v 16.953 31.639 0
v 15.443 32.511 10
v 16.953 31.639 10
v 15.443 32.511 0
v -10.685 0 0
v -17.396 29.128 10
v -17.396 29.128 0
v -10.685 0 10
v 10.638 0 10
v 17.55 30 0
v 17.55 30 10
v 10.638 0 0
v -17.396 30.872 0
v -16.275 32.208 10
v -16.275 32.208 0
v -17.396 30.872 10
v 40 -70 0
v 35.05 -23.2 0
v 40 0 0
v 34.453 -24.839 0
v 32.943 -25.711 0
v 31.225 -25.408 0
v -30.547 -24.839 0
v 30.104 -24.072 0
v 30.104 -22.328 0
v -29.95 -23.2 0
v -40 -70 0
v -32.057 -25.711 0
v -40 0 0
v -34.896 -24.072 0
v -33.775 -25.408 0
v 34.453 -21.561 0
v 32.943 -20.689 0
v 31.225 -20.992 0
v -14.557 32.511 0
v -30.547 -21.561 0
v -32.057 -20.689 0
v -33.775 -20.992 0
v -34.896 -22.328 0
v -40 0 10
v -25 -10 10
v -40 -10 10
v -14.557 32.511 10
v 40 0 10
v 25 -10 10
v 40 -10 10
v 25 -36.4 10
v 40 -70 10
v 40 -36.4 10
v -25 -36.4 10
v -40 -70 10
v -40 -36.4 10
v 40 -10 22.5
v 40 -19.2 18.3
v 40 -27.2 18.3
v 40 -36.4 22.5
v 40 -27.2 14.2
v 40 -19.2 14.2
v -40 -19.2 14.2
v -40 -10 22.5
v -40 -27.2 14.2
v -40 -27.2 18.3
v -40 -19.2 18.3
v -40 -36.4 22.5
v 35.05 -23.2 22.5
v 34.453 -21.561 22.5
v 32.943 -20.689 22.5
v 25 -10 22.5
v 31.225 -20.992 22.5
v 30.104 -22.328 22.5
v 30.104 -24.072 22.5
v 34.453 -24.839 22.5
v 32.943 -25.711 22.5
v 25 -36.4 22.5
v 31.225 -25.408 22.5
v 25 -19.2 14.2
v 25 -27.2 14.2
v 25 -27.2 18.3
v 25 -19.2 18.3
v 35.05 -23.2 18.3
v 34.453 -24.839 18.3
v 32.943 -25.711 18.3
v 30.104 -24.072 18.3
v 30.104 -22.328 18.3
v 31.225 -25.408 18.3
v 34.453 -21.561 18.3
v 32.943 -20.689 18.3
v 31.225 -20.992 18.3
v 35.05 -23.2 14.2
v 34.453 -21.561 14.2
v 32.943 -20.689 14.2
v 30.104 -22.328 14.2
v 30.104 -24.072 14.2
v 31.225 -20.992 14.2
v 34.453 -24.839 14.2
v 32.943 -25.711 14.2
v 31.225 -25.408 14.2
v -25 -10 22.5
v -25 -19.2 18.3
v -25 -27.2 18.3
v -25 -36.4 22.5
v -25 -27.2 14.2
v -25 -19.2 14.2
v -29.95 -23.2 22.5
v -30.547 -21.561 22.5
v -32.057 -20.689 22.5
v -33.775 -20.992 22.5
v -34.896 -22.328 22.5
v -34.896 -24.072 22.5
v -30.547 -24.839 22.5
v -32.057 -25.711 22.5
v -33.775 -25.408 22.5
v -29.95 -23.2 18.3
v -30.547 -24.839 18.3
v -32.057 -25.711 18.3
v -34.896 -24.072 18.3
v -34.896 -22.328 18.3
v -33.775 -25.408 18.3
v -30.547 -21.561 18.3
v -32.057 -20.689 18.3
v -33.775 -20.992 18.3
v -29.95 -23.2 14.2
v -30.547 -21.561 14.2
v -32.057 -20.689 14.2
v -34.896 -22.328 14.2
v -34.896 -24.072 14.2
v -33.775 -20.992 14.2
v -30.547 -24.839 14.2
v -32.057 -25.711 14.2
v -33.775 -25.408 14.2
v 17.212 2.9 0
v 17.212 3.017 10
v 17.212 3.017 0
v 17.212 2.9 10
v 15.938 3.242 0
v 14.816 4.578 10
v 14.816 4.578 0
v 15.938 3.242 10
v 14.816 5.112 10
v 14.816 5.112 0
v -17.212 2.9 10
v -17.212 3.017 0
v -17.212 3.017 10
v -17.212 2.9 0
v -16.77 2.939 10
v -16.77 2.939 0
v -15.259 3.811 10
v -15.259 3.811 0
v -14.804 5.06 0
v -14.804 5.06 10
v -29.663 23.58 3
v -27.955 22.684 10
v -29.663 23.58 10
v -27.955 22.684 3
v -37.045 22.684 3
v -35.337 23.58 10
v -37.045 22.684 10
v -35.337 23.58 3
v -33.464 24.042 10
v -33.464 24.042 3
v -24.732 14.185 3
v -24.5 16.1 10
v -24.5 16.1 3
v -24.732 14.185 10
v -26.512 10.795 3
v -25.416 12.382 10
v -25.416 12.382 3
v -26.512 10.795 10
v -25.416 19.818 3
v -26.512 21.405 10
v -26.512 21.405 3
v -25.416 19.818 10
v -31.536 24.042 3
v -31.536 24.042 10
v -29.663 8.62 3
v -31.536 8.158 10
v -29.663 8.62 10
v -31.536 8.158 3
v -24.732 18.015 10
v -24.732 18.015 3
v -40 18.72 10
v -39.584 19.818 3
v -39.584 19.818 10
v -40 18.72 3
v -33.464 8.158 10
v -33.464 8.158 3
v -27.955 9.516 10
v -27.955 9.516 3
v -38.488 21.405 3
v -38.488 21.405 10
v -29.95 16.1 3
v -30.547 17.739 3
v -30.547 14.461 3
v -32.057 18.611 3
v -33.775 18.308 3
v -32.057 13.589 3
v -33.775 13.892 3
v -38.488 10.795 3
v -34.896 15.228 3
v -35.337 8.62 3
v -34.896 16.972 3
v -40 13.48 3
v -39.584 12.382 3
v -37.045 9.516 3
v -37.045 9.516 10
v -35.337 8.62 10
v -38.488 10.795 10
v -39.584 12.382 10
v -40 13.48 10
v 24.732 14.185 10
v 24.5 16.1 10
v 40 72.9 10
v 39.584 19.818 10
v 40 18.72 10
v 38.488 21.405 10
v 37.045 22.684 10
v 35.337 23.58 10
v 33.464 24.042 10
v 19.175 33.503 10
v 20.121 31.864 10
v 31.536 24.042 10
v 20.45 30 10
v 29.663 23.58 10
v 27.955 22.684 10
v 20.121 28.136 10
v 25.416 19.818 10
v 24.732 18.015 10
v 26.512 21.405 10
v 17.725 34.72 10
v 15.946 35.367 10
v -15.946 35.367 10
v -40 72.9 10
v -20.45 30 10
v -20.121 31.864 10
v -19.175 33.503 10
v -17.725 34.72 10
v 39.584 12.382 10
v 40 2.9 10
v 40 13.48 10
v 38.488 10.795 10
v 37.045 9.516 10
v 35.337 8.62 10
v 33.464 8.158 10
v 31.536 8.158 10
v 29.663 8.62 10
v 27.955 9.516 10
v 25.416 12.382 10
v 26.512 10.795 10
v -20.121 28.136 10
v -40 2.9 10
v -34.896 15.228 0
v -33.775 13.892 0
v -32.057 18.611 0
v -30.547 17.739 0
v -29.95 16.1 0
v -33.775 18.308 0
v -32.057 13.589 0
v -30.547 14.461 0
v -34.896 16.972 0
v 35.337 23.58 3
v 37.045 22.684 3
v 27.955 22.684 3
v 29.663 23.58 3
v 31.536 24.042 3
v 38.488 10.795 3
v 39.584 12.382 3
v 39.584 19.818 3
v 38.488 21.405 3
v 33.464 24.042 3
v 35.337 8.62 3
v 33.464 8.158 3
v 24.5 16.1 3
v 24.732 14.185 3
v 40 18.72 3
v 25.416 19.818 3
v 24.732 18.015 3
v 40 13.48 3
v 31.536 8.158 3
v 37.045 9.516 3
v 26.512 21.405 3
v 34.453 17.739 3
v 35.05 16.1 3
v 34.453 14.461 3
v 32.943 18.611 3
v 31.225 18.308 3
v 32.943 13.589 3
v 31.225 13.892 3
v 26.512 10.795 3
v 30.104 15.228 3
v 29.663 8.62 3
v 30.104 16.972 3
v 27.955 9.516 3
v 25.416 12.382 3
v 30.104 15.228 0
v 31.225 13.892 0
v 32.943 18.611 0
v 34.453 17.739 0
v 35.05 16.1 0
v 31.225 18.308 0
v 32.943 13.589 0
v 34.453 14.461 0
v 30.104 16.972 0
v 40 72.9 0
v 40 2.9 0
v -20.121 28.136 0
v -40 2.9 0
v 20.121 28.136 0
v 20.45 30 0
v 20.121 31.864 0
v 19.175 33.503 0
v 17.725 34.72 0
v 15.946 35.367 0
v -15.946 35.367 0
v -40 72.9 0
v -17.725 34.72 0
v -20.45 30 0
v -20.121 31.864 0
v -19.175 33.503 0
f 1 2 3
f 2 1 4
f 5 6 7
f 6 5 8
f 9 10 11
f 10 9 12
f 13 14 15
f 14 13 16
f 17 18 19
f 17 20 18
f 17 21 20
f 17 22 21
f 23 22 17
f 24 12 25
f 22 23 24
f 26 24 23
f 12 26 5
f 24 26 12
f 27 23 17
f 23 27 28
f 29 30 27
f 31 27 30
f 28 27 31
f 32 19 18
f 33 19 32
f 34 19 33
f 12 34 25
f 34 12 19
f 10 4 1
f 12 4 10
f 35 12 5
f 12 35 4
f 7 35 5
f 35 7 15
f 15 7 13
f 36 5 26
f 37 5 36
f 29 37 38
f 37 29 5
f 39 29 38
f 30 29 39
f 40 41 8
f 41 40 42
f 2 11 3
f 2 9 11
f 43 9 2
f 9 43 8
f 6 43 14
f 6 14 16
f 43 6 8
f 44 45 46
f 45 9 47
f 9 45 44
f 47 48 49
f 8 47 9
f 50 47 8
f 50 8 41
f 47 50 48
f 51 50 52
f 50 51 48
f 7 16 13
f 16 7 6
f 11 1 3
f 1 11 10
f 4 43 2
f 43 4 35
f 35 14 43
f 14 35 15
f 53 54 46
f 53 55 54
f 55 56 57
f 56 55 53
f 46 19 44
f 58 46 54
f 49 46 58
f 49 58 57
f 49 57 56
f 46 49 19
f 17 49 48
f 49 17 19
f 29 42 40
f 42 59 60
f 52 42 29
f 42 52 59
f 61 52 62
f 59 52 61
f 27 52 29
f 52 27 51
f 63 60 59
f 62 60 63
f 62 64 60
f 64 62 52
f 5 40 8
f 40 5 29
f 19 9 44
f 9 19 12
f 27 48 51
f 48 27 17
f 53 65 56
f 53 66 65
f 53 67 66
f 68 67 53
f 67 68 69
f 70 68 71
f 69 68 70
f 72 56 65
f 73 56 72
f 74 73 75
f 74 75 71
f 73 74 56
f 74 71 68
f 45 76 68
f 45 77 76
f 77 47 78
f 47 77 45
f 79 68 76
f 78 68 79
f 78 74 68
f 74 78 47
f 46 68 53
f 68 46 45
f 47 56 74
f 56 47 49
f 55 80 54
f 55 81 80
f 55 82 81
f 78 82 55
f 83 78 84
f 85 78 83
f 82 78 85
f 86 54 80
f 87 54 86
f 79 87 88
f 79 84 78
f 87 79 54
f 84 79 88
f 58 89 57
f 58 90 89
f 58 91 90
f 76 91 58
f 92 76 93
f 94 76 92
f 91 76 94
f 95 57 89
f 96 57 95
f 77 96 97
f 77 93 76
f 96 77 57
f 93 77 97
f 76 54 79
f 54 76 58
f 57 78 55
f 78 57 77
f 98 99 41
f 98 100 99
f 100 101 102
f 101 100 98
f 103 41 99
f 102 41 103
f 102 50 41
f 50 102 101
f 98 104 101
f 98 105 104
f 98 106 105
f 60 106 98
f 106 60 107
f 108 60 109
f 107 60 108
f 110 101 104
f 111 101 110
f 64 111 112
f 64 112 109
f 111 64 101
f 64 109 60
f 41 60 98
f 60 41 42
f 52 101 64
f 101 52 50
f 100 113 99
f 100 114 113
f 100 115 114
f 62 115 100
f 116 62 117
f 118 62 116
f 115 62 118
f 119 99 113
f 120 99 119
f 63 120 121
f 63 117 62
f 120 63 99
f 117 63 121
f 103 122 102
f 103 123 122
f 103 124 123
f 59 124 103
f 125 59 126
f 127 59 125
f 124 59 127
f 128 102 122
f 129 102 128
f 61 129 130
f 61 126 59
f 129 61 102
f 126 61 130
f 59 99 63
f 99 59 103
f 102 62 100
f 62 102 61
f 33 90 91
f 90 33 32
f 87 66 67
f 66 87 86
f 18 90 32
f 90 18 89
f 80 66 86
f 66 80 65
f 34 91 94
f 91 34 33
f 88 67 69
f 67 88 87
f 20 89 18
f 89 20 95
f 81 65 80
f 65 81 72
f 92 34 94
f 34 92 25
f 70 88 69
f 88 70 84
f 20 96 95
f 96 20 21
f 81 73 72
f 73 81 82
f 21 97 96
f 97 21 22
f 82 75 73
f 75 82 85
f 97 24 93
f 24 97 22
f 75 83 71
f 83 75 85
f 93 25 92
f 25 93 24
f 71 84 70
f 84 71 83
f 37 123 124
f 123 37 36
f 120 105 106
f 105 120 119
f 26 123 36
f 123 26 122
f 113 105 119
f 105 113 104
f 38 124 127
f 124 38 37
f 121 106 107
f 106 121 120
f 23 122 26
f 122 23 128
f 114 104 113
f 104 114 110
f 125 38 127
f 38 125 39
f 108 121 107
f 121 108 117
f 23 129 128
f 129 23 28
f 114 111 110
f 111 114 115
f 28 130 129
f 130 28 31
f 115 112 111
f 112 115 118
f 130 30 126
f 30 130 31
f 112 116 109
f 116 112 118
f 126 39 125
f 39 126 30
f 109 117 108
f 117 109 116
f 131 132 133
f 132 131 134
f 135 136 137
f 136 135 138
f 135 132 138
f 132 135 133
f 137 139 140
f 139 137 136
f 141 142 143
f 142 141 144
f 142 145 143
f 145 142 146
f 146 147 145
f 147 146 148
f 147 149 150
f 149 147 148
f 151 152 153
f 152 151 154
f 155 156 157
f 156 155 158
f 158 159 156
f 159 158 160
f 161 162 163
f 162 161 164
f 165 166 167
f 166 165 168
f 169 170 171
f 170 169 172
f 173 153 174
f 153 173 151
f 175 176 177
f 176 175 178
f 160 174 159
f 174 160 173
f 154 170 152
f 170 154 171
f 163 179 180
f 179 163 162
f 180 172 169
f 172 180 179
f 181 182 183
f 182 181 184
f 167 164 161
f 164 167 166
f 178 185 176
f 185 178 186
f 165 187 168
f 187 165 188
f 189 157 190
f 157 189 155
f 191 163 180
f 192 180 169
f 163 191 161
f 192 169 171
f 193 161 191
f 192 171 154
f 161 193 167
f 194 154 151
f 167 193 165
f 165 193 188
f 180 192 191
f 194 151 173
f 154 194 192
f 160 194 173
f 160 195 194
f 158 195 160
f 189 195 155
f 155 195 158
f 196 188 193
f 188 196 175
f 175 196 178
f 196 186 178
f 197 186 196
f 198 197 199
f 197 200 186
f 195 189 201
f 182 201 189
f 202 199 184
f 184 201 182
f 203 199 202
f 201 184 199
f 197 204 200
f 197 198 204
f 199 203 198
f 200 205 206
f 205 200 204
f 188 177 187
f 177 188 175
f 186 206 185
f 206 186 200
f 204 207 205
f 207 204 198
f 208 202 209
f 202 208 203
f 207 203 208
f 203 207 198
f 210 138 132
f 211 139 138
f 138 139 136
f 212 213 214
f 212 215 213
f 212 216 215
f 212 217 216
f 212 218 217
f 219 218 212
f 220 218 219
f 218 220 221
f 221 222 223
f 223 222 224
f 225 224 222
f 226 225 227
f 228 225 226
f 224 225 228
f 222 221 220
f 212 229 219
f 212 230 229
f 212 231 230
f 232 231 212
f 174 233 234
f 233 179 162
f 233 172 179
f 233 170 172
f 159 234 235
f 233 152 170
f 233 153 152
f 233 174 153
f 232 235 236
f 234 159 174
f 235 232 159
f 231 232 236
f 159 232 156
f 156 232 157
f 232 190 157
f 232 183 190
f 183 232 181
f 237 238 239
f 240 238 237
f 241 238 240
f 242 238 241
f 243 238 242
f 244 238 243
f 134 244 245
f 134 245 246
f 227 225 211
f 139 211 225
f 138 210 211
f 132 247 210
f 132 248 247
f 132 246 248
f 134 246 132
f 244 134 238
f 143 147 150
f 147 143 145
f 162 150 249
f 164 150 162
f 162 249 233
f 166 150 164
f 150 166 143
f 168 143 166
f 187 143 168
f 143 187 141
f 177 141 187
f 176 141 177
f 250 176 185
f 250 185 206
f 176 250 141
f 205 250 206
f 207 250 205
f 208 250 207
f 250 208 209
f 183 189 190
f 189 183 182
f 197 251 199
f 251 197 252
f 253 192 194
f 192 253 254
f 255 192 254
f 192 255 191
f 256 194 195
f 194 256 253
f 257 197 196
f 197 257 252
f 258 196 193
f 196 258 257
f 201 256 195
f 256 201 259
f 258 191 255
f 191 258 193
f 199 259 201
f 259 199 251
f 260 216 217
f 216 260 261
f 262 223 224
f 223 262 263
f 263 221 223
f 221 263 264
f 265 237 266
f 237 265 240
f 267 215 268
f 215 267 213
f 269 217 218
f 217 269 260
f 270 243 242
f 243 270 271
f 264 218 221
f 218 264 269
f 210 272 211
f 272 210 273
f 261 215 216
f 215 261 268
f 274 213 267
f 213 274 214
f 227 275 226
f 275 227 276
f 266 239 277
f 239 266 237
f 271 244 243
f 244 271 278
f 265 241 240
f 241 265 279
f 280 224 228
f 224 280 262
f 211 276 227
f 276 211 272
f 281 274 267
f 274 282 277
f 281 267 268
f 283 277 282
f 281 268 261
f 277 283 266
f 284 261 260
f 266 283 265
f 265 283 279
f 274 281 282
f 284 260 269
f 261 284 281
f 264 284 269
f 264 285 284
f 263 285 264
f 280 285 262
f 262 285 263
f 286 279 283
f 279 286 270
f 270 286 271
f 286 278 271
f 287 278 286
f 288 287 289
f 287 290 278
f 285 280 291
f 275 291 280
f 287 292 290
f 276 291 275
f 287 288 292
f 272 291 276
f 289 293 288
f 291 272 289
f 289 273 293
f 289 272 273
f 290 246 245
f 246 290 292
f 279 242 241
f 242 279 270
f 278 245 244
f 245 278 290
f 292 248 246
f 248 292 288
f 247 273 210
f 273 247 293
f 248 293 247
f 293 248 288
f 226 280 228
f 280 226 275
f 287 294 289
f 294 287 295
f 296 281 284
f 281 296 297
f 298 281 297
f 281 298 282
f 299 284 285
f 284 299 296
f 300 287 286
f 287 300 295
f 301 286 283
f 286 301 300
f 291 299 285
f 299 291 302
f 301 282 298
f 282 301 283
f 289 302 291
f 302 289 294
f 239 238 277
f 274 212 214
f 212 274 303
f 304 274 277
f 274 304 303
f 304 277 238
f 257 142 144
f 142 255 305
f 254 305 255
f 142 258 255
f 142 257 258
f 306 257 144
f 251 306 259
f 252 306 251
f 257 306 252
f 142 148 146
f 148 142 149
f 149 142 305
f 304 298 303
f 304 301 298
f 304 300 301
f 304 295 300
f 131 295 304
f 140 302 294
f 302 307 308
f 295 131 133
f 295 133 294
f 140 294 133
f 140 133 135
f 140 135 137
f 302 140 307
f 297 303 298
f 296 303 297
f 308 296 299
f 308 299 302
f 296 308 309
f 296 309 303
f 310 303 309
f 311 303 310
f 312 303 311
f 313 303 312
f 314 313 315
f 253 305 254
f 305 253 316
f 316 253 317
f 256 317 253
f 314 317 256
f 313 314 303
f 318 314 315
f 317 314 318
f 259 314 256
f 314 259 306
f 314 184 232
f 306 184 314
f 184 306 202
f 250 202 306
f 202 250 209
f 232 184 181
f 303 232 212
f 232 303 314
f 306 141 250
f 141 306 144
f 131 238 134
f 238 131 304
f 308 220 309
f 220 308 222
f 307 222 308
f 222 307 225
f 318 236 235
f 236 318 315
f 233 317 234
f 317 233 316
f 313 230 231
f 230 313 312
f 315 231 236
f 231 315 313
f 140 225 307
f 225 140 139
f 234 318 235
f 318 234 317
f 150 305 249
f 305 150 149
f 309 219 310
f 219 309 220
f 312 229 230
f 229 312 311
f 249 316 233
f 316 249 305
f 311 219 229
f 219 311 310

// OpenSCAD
// Diameter of the routerbit
router=8;
// Diameter of the guide bushing
bushing = 10.8 + 0.1;
delta = bushing - router;

// Width of the dovetail at the wider end
dovewide = 30;
// Width of the dovetail at the narrower end
dovenarrow = 15;
// Depth of the dovetail
dovedept = 30;

// Width of the baseplate
basewidth = 80;
// Length of the baseplate
baselength = 70;

// Thickness of the template
templatethickness = 10;

// Width of the material
materialwidth = 50;
// Thickness of the material
materialthickness = 25;

// Screwshaft
screwshaft = 5.1;
// Diameter of the screwhead
screwheaddiameter = 16;
// Legnth of the Screwhead
screwheadlength = 7;
// Size of the pocket for the nut
nutparallelwidth = 8.0;
// Diagnal measurement of the nut
nutdiagonalwidth = 8.8;
// Thickness of the nut
nutthickness = 4.1;

// Shoulder
offset = 10;


// Size of the screwblocks
screwblocksize = (basewidth-materialwidth) / 2;


difference() {

  union() {

    translate([0,0,0]) {

        hull() {
          translate([-0.5*dovenarrow,-0.5*(router-delta),0]) cylinder(d=router-delta, h=templatethickness);
          translate([0.5*dovenarrow,-0.5*(router-delta),0]) cylinder(d=router-delta, h=templatethickness);
          translate([-0.5*dovewide,dovedept,0]) cylinder(d=router-delta, h=templatethickness);
          translate([0.5*dovewide,dovedept,0]) cylinder(d=router-delta, h=templatethickness);
        }

        translate([-0.5*basewidth,-baselength,0]) cube([basewidth,baselength,templatethickness]);

    }

    translate([materialthickness, -3*nutdiagonalwidth-offset, 0])
      difference() {
        cube([screwblocksize,3*nutdiagonalwidth, 0.5*materialthickness+templatethickness]);
        translate([0.5*screwblocksize,1.5*nutdiagonalwidth,0.25*materialthickness+templatethickness]) cube([1.1*screwblocksize,nutparallelwidth,nutthickness], center=true);
    }

    translate([-materialthickness-screwblocksize, -3*nutdiagonalwidth-offset, 0])
      difference() {
        cube([screwblocksize,3*nutdiagonalwidth, 0.5*materialthickness+templatethickness]);
        translate([0.5*screwblocksize,1.5*nutdiagonalwidth,0.25*materialthickness+templatethickness]) cube([1.1*screwblocksize,nutparallelwidth,nutthickness], center=true);
    }

  }

  translate([materialthickness, -3*nutdiagonalwidth-offset, 0])
      translate([0.5*screwblocksize,1.5*nutdiagonalwidth]) cylinder(d=screwshaft,h=1.1*(0.5*materialthickness+templatethickness));


  translate([-materialthickness-screwblocksize, -3*nutdiagonalwidth-offset, 0])
      translate([0.5*screwblocksize,1.5*nutdiagonalwidth]) cylinder(d=screwshaft,h=1.1*(0.5*materialthickness+templatethickness));

}

// Here comes the negative form

radius = 0.5 * (router-delta);
dy = (radius+delta);

angle = atan(((dovewide-dovenarrow)/2)/dovedept);
d1 = tan(angle) * dy;
dx = dovenarrow/2 +radius + 2*delta +d1;

translate([0,0,templatethickness]) mirror([0,0,1])
difference() {

  translate([-0.5*basewidth,delta,0]) cube([basewidth,baselength,templatethickness]);

    hull() {
      translate([-0.5*dovenarrow,-0.5*(router-delta),-0.1]) cylinder(d=router+delta, h=templatethickness*1.1);
      translate([0.5*dovenarrow,-0.5*(router-delta),-0.1]) cylinder(d=router+delta, h=templatethickness*1.1);
      translate([-0.5*dovewide,dovedept,-0.1]) cylinder(d=router+delta, h=templatethickness*1.1);
      translate([0.5*dovewide,dovedept,-0.1]) cylinder(d=router+delta, h=templatethickness*1.1);
    }

    translate([dx,dy,-0.1]) difference() {
        translate([-2*radius,-2*radius,0]) cube([2*radius,2*radius,templatethickness*1.1]);
        cylinder(r=radius, h=templatethickness*1.1);
    }

    translate([-dx,dy,-0.1]) difference() {
        translate([0,-2*radius,0]) cube([2*radius,2*radius,templatethickness*1.1]);
        cylinder(r=radius, h=templatethickness*1.1);
    }


    // Create the holes and the block to screw the 2 parts together
    translate([-materialthickness-0.5*screwblocksize,delta+1.5*nutdiagonalwidth,0]) union() {
      cylinder(d=screwheaddiameter, h=screwheadlength);
      cylinder(d=screwshaft, h=templatethickness*1.1);
    }
    translate([materialthickness+0.5*screwblocksize,delta+1.5*nutdiagonalwidth,0]) union() {
      cylinder(d=screwheaddiameter, h=screwheadlength);
      cylinder(d=screwshaft, h=templatethickness*1.1);
    }


}
